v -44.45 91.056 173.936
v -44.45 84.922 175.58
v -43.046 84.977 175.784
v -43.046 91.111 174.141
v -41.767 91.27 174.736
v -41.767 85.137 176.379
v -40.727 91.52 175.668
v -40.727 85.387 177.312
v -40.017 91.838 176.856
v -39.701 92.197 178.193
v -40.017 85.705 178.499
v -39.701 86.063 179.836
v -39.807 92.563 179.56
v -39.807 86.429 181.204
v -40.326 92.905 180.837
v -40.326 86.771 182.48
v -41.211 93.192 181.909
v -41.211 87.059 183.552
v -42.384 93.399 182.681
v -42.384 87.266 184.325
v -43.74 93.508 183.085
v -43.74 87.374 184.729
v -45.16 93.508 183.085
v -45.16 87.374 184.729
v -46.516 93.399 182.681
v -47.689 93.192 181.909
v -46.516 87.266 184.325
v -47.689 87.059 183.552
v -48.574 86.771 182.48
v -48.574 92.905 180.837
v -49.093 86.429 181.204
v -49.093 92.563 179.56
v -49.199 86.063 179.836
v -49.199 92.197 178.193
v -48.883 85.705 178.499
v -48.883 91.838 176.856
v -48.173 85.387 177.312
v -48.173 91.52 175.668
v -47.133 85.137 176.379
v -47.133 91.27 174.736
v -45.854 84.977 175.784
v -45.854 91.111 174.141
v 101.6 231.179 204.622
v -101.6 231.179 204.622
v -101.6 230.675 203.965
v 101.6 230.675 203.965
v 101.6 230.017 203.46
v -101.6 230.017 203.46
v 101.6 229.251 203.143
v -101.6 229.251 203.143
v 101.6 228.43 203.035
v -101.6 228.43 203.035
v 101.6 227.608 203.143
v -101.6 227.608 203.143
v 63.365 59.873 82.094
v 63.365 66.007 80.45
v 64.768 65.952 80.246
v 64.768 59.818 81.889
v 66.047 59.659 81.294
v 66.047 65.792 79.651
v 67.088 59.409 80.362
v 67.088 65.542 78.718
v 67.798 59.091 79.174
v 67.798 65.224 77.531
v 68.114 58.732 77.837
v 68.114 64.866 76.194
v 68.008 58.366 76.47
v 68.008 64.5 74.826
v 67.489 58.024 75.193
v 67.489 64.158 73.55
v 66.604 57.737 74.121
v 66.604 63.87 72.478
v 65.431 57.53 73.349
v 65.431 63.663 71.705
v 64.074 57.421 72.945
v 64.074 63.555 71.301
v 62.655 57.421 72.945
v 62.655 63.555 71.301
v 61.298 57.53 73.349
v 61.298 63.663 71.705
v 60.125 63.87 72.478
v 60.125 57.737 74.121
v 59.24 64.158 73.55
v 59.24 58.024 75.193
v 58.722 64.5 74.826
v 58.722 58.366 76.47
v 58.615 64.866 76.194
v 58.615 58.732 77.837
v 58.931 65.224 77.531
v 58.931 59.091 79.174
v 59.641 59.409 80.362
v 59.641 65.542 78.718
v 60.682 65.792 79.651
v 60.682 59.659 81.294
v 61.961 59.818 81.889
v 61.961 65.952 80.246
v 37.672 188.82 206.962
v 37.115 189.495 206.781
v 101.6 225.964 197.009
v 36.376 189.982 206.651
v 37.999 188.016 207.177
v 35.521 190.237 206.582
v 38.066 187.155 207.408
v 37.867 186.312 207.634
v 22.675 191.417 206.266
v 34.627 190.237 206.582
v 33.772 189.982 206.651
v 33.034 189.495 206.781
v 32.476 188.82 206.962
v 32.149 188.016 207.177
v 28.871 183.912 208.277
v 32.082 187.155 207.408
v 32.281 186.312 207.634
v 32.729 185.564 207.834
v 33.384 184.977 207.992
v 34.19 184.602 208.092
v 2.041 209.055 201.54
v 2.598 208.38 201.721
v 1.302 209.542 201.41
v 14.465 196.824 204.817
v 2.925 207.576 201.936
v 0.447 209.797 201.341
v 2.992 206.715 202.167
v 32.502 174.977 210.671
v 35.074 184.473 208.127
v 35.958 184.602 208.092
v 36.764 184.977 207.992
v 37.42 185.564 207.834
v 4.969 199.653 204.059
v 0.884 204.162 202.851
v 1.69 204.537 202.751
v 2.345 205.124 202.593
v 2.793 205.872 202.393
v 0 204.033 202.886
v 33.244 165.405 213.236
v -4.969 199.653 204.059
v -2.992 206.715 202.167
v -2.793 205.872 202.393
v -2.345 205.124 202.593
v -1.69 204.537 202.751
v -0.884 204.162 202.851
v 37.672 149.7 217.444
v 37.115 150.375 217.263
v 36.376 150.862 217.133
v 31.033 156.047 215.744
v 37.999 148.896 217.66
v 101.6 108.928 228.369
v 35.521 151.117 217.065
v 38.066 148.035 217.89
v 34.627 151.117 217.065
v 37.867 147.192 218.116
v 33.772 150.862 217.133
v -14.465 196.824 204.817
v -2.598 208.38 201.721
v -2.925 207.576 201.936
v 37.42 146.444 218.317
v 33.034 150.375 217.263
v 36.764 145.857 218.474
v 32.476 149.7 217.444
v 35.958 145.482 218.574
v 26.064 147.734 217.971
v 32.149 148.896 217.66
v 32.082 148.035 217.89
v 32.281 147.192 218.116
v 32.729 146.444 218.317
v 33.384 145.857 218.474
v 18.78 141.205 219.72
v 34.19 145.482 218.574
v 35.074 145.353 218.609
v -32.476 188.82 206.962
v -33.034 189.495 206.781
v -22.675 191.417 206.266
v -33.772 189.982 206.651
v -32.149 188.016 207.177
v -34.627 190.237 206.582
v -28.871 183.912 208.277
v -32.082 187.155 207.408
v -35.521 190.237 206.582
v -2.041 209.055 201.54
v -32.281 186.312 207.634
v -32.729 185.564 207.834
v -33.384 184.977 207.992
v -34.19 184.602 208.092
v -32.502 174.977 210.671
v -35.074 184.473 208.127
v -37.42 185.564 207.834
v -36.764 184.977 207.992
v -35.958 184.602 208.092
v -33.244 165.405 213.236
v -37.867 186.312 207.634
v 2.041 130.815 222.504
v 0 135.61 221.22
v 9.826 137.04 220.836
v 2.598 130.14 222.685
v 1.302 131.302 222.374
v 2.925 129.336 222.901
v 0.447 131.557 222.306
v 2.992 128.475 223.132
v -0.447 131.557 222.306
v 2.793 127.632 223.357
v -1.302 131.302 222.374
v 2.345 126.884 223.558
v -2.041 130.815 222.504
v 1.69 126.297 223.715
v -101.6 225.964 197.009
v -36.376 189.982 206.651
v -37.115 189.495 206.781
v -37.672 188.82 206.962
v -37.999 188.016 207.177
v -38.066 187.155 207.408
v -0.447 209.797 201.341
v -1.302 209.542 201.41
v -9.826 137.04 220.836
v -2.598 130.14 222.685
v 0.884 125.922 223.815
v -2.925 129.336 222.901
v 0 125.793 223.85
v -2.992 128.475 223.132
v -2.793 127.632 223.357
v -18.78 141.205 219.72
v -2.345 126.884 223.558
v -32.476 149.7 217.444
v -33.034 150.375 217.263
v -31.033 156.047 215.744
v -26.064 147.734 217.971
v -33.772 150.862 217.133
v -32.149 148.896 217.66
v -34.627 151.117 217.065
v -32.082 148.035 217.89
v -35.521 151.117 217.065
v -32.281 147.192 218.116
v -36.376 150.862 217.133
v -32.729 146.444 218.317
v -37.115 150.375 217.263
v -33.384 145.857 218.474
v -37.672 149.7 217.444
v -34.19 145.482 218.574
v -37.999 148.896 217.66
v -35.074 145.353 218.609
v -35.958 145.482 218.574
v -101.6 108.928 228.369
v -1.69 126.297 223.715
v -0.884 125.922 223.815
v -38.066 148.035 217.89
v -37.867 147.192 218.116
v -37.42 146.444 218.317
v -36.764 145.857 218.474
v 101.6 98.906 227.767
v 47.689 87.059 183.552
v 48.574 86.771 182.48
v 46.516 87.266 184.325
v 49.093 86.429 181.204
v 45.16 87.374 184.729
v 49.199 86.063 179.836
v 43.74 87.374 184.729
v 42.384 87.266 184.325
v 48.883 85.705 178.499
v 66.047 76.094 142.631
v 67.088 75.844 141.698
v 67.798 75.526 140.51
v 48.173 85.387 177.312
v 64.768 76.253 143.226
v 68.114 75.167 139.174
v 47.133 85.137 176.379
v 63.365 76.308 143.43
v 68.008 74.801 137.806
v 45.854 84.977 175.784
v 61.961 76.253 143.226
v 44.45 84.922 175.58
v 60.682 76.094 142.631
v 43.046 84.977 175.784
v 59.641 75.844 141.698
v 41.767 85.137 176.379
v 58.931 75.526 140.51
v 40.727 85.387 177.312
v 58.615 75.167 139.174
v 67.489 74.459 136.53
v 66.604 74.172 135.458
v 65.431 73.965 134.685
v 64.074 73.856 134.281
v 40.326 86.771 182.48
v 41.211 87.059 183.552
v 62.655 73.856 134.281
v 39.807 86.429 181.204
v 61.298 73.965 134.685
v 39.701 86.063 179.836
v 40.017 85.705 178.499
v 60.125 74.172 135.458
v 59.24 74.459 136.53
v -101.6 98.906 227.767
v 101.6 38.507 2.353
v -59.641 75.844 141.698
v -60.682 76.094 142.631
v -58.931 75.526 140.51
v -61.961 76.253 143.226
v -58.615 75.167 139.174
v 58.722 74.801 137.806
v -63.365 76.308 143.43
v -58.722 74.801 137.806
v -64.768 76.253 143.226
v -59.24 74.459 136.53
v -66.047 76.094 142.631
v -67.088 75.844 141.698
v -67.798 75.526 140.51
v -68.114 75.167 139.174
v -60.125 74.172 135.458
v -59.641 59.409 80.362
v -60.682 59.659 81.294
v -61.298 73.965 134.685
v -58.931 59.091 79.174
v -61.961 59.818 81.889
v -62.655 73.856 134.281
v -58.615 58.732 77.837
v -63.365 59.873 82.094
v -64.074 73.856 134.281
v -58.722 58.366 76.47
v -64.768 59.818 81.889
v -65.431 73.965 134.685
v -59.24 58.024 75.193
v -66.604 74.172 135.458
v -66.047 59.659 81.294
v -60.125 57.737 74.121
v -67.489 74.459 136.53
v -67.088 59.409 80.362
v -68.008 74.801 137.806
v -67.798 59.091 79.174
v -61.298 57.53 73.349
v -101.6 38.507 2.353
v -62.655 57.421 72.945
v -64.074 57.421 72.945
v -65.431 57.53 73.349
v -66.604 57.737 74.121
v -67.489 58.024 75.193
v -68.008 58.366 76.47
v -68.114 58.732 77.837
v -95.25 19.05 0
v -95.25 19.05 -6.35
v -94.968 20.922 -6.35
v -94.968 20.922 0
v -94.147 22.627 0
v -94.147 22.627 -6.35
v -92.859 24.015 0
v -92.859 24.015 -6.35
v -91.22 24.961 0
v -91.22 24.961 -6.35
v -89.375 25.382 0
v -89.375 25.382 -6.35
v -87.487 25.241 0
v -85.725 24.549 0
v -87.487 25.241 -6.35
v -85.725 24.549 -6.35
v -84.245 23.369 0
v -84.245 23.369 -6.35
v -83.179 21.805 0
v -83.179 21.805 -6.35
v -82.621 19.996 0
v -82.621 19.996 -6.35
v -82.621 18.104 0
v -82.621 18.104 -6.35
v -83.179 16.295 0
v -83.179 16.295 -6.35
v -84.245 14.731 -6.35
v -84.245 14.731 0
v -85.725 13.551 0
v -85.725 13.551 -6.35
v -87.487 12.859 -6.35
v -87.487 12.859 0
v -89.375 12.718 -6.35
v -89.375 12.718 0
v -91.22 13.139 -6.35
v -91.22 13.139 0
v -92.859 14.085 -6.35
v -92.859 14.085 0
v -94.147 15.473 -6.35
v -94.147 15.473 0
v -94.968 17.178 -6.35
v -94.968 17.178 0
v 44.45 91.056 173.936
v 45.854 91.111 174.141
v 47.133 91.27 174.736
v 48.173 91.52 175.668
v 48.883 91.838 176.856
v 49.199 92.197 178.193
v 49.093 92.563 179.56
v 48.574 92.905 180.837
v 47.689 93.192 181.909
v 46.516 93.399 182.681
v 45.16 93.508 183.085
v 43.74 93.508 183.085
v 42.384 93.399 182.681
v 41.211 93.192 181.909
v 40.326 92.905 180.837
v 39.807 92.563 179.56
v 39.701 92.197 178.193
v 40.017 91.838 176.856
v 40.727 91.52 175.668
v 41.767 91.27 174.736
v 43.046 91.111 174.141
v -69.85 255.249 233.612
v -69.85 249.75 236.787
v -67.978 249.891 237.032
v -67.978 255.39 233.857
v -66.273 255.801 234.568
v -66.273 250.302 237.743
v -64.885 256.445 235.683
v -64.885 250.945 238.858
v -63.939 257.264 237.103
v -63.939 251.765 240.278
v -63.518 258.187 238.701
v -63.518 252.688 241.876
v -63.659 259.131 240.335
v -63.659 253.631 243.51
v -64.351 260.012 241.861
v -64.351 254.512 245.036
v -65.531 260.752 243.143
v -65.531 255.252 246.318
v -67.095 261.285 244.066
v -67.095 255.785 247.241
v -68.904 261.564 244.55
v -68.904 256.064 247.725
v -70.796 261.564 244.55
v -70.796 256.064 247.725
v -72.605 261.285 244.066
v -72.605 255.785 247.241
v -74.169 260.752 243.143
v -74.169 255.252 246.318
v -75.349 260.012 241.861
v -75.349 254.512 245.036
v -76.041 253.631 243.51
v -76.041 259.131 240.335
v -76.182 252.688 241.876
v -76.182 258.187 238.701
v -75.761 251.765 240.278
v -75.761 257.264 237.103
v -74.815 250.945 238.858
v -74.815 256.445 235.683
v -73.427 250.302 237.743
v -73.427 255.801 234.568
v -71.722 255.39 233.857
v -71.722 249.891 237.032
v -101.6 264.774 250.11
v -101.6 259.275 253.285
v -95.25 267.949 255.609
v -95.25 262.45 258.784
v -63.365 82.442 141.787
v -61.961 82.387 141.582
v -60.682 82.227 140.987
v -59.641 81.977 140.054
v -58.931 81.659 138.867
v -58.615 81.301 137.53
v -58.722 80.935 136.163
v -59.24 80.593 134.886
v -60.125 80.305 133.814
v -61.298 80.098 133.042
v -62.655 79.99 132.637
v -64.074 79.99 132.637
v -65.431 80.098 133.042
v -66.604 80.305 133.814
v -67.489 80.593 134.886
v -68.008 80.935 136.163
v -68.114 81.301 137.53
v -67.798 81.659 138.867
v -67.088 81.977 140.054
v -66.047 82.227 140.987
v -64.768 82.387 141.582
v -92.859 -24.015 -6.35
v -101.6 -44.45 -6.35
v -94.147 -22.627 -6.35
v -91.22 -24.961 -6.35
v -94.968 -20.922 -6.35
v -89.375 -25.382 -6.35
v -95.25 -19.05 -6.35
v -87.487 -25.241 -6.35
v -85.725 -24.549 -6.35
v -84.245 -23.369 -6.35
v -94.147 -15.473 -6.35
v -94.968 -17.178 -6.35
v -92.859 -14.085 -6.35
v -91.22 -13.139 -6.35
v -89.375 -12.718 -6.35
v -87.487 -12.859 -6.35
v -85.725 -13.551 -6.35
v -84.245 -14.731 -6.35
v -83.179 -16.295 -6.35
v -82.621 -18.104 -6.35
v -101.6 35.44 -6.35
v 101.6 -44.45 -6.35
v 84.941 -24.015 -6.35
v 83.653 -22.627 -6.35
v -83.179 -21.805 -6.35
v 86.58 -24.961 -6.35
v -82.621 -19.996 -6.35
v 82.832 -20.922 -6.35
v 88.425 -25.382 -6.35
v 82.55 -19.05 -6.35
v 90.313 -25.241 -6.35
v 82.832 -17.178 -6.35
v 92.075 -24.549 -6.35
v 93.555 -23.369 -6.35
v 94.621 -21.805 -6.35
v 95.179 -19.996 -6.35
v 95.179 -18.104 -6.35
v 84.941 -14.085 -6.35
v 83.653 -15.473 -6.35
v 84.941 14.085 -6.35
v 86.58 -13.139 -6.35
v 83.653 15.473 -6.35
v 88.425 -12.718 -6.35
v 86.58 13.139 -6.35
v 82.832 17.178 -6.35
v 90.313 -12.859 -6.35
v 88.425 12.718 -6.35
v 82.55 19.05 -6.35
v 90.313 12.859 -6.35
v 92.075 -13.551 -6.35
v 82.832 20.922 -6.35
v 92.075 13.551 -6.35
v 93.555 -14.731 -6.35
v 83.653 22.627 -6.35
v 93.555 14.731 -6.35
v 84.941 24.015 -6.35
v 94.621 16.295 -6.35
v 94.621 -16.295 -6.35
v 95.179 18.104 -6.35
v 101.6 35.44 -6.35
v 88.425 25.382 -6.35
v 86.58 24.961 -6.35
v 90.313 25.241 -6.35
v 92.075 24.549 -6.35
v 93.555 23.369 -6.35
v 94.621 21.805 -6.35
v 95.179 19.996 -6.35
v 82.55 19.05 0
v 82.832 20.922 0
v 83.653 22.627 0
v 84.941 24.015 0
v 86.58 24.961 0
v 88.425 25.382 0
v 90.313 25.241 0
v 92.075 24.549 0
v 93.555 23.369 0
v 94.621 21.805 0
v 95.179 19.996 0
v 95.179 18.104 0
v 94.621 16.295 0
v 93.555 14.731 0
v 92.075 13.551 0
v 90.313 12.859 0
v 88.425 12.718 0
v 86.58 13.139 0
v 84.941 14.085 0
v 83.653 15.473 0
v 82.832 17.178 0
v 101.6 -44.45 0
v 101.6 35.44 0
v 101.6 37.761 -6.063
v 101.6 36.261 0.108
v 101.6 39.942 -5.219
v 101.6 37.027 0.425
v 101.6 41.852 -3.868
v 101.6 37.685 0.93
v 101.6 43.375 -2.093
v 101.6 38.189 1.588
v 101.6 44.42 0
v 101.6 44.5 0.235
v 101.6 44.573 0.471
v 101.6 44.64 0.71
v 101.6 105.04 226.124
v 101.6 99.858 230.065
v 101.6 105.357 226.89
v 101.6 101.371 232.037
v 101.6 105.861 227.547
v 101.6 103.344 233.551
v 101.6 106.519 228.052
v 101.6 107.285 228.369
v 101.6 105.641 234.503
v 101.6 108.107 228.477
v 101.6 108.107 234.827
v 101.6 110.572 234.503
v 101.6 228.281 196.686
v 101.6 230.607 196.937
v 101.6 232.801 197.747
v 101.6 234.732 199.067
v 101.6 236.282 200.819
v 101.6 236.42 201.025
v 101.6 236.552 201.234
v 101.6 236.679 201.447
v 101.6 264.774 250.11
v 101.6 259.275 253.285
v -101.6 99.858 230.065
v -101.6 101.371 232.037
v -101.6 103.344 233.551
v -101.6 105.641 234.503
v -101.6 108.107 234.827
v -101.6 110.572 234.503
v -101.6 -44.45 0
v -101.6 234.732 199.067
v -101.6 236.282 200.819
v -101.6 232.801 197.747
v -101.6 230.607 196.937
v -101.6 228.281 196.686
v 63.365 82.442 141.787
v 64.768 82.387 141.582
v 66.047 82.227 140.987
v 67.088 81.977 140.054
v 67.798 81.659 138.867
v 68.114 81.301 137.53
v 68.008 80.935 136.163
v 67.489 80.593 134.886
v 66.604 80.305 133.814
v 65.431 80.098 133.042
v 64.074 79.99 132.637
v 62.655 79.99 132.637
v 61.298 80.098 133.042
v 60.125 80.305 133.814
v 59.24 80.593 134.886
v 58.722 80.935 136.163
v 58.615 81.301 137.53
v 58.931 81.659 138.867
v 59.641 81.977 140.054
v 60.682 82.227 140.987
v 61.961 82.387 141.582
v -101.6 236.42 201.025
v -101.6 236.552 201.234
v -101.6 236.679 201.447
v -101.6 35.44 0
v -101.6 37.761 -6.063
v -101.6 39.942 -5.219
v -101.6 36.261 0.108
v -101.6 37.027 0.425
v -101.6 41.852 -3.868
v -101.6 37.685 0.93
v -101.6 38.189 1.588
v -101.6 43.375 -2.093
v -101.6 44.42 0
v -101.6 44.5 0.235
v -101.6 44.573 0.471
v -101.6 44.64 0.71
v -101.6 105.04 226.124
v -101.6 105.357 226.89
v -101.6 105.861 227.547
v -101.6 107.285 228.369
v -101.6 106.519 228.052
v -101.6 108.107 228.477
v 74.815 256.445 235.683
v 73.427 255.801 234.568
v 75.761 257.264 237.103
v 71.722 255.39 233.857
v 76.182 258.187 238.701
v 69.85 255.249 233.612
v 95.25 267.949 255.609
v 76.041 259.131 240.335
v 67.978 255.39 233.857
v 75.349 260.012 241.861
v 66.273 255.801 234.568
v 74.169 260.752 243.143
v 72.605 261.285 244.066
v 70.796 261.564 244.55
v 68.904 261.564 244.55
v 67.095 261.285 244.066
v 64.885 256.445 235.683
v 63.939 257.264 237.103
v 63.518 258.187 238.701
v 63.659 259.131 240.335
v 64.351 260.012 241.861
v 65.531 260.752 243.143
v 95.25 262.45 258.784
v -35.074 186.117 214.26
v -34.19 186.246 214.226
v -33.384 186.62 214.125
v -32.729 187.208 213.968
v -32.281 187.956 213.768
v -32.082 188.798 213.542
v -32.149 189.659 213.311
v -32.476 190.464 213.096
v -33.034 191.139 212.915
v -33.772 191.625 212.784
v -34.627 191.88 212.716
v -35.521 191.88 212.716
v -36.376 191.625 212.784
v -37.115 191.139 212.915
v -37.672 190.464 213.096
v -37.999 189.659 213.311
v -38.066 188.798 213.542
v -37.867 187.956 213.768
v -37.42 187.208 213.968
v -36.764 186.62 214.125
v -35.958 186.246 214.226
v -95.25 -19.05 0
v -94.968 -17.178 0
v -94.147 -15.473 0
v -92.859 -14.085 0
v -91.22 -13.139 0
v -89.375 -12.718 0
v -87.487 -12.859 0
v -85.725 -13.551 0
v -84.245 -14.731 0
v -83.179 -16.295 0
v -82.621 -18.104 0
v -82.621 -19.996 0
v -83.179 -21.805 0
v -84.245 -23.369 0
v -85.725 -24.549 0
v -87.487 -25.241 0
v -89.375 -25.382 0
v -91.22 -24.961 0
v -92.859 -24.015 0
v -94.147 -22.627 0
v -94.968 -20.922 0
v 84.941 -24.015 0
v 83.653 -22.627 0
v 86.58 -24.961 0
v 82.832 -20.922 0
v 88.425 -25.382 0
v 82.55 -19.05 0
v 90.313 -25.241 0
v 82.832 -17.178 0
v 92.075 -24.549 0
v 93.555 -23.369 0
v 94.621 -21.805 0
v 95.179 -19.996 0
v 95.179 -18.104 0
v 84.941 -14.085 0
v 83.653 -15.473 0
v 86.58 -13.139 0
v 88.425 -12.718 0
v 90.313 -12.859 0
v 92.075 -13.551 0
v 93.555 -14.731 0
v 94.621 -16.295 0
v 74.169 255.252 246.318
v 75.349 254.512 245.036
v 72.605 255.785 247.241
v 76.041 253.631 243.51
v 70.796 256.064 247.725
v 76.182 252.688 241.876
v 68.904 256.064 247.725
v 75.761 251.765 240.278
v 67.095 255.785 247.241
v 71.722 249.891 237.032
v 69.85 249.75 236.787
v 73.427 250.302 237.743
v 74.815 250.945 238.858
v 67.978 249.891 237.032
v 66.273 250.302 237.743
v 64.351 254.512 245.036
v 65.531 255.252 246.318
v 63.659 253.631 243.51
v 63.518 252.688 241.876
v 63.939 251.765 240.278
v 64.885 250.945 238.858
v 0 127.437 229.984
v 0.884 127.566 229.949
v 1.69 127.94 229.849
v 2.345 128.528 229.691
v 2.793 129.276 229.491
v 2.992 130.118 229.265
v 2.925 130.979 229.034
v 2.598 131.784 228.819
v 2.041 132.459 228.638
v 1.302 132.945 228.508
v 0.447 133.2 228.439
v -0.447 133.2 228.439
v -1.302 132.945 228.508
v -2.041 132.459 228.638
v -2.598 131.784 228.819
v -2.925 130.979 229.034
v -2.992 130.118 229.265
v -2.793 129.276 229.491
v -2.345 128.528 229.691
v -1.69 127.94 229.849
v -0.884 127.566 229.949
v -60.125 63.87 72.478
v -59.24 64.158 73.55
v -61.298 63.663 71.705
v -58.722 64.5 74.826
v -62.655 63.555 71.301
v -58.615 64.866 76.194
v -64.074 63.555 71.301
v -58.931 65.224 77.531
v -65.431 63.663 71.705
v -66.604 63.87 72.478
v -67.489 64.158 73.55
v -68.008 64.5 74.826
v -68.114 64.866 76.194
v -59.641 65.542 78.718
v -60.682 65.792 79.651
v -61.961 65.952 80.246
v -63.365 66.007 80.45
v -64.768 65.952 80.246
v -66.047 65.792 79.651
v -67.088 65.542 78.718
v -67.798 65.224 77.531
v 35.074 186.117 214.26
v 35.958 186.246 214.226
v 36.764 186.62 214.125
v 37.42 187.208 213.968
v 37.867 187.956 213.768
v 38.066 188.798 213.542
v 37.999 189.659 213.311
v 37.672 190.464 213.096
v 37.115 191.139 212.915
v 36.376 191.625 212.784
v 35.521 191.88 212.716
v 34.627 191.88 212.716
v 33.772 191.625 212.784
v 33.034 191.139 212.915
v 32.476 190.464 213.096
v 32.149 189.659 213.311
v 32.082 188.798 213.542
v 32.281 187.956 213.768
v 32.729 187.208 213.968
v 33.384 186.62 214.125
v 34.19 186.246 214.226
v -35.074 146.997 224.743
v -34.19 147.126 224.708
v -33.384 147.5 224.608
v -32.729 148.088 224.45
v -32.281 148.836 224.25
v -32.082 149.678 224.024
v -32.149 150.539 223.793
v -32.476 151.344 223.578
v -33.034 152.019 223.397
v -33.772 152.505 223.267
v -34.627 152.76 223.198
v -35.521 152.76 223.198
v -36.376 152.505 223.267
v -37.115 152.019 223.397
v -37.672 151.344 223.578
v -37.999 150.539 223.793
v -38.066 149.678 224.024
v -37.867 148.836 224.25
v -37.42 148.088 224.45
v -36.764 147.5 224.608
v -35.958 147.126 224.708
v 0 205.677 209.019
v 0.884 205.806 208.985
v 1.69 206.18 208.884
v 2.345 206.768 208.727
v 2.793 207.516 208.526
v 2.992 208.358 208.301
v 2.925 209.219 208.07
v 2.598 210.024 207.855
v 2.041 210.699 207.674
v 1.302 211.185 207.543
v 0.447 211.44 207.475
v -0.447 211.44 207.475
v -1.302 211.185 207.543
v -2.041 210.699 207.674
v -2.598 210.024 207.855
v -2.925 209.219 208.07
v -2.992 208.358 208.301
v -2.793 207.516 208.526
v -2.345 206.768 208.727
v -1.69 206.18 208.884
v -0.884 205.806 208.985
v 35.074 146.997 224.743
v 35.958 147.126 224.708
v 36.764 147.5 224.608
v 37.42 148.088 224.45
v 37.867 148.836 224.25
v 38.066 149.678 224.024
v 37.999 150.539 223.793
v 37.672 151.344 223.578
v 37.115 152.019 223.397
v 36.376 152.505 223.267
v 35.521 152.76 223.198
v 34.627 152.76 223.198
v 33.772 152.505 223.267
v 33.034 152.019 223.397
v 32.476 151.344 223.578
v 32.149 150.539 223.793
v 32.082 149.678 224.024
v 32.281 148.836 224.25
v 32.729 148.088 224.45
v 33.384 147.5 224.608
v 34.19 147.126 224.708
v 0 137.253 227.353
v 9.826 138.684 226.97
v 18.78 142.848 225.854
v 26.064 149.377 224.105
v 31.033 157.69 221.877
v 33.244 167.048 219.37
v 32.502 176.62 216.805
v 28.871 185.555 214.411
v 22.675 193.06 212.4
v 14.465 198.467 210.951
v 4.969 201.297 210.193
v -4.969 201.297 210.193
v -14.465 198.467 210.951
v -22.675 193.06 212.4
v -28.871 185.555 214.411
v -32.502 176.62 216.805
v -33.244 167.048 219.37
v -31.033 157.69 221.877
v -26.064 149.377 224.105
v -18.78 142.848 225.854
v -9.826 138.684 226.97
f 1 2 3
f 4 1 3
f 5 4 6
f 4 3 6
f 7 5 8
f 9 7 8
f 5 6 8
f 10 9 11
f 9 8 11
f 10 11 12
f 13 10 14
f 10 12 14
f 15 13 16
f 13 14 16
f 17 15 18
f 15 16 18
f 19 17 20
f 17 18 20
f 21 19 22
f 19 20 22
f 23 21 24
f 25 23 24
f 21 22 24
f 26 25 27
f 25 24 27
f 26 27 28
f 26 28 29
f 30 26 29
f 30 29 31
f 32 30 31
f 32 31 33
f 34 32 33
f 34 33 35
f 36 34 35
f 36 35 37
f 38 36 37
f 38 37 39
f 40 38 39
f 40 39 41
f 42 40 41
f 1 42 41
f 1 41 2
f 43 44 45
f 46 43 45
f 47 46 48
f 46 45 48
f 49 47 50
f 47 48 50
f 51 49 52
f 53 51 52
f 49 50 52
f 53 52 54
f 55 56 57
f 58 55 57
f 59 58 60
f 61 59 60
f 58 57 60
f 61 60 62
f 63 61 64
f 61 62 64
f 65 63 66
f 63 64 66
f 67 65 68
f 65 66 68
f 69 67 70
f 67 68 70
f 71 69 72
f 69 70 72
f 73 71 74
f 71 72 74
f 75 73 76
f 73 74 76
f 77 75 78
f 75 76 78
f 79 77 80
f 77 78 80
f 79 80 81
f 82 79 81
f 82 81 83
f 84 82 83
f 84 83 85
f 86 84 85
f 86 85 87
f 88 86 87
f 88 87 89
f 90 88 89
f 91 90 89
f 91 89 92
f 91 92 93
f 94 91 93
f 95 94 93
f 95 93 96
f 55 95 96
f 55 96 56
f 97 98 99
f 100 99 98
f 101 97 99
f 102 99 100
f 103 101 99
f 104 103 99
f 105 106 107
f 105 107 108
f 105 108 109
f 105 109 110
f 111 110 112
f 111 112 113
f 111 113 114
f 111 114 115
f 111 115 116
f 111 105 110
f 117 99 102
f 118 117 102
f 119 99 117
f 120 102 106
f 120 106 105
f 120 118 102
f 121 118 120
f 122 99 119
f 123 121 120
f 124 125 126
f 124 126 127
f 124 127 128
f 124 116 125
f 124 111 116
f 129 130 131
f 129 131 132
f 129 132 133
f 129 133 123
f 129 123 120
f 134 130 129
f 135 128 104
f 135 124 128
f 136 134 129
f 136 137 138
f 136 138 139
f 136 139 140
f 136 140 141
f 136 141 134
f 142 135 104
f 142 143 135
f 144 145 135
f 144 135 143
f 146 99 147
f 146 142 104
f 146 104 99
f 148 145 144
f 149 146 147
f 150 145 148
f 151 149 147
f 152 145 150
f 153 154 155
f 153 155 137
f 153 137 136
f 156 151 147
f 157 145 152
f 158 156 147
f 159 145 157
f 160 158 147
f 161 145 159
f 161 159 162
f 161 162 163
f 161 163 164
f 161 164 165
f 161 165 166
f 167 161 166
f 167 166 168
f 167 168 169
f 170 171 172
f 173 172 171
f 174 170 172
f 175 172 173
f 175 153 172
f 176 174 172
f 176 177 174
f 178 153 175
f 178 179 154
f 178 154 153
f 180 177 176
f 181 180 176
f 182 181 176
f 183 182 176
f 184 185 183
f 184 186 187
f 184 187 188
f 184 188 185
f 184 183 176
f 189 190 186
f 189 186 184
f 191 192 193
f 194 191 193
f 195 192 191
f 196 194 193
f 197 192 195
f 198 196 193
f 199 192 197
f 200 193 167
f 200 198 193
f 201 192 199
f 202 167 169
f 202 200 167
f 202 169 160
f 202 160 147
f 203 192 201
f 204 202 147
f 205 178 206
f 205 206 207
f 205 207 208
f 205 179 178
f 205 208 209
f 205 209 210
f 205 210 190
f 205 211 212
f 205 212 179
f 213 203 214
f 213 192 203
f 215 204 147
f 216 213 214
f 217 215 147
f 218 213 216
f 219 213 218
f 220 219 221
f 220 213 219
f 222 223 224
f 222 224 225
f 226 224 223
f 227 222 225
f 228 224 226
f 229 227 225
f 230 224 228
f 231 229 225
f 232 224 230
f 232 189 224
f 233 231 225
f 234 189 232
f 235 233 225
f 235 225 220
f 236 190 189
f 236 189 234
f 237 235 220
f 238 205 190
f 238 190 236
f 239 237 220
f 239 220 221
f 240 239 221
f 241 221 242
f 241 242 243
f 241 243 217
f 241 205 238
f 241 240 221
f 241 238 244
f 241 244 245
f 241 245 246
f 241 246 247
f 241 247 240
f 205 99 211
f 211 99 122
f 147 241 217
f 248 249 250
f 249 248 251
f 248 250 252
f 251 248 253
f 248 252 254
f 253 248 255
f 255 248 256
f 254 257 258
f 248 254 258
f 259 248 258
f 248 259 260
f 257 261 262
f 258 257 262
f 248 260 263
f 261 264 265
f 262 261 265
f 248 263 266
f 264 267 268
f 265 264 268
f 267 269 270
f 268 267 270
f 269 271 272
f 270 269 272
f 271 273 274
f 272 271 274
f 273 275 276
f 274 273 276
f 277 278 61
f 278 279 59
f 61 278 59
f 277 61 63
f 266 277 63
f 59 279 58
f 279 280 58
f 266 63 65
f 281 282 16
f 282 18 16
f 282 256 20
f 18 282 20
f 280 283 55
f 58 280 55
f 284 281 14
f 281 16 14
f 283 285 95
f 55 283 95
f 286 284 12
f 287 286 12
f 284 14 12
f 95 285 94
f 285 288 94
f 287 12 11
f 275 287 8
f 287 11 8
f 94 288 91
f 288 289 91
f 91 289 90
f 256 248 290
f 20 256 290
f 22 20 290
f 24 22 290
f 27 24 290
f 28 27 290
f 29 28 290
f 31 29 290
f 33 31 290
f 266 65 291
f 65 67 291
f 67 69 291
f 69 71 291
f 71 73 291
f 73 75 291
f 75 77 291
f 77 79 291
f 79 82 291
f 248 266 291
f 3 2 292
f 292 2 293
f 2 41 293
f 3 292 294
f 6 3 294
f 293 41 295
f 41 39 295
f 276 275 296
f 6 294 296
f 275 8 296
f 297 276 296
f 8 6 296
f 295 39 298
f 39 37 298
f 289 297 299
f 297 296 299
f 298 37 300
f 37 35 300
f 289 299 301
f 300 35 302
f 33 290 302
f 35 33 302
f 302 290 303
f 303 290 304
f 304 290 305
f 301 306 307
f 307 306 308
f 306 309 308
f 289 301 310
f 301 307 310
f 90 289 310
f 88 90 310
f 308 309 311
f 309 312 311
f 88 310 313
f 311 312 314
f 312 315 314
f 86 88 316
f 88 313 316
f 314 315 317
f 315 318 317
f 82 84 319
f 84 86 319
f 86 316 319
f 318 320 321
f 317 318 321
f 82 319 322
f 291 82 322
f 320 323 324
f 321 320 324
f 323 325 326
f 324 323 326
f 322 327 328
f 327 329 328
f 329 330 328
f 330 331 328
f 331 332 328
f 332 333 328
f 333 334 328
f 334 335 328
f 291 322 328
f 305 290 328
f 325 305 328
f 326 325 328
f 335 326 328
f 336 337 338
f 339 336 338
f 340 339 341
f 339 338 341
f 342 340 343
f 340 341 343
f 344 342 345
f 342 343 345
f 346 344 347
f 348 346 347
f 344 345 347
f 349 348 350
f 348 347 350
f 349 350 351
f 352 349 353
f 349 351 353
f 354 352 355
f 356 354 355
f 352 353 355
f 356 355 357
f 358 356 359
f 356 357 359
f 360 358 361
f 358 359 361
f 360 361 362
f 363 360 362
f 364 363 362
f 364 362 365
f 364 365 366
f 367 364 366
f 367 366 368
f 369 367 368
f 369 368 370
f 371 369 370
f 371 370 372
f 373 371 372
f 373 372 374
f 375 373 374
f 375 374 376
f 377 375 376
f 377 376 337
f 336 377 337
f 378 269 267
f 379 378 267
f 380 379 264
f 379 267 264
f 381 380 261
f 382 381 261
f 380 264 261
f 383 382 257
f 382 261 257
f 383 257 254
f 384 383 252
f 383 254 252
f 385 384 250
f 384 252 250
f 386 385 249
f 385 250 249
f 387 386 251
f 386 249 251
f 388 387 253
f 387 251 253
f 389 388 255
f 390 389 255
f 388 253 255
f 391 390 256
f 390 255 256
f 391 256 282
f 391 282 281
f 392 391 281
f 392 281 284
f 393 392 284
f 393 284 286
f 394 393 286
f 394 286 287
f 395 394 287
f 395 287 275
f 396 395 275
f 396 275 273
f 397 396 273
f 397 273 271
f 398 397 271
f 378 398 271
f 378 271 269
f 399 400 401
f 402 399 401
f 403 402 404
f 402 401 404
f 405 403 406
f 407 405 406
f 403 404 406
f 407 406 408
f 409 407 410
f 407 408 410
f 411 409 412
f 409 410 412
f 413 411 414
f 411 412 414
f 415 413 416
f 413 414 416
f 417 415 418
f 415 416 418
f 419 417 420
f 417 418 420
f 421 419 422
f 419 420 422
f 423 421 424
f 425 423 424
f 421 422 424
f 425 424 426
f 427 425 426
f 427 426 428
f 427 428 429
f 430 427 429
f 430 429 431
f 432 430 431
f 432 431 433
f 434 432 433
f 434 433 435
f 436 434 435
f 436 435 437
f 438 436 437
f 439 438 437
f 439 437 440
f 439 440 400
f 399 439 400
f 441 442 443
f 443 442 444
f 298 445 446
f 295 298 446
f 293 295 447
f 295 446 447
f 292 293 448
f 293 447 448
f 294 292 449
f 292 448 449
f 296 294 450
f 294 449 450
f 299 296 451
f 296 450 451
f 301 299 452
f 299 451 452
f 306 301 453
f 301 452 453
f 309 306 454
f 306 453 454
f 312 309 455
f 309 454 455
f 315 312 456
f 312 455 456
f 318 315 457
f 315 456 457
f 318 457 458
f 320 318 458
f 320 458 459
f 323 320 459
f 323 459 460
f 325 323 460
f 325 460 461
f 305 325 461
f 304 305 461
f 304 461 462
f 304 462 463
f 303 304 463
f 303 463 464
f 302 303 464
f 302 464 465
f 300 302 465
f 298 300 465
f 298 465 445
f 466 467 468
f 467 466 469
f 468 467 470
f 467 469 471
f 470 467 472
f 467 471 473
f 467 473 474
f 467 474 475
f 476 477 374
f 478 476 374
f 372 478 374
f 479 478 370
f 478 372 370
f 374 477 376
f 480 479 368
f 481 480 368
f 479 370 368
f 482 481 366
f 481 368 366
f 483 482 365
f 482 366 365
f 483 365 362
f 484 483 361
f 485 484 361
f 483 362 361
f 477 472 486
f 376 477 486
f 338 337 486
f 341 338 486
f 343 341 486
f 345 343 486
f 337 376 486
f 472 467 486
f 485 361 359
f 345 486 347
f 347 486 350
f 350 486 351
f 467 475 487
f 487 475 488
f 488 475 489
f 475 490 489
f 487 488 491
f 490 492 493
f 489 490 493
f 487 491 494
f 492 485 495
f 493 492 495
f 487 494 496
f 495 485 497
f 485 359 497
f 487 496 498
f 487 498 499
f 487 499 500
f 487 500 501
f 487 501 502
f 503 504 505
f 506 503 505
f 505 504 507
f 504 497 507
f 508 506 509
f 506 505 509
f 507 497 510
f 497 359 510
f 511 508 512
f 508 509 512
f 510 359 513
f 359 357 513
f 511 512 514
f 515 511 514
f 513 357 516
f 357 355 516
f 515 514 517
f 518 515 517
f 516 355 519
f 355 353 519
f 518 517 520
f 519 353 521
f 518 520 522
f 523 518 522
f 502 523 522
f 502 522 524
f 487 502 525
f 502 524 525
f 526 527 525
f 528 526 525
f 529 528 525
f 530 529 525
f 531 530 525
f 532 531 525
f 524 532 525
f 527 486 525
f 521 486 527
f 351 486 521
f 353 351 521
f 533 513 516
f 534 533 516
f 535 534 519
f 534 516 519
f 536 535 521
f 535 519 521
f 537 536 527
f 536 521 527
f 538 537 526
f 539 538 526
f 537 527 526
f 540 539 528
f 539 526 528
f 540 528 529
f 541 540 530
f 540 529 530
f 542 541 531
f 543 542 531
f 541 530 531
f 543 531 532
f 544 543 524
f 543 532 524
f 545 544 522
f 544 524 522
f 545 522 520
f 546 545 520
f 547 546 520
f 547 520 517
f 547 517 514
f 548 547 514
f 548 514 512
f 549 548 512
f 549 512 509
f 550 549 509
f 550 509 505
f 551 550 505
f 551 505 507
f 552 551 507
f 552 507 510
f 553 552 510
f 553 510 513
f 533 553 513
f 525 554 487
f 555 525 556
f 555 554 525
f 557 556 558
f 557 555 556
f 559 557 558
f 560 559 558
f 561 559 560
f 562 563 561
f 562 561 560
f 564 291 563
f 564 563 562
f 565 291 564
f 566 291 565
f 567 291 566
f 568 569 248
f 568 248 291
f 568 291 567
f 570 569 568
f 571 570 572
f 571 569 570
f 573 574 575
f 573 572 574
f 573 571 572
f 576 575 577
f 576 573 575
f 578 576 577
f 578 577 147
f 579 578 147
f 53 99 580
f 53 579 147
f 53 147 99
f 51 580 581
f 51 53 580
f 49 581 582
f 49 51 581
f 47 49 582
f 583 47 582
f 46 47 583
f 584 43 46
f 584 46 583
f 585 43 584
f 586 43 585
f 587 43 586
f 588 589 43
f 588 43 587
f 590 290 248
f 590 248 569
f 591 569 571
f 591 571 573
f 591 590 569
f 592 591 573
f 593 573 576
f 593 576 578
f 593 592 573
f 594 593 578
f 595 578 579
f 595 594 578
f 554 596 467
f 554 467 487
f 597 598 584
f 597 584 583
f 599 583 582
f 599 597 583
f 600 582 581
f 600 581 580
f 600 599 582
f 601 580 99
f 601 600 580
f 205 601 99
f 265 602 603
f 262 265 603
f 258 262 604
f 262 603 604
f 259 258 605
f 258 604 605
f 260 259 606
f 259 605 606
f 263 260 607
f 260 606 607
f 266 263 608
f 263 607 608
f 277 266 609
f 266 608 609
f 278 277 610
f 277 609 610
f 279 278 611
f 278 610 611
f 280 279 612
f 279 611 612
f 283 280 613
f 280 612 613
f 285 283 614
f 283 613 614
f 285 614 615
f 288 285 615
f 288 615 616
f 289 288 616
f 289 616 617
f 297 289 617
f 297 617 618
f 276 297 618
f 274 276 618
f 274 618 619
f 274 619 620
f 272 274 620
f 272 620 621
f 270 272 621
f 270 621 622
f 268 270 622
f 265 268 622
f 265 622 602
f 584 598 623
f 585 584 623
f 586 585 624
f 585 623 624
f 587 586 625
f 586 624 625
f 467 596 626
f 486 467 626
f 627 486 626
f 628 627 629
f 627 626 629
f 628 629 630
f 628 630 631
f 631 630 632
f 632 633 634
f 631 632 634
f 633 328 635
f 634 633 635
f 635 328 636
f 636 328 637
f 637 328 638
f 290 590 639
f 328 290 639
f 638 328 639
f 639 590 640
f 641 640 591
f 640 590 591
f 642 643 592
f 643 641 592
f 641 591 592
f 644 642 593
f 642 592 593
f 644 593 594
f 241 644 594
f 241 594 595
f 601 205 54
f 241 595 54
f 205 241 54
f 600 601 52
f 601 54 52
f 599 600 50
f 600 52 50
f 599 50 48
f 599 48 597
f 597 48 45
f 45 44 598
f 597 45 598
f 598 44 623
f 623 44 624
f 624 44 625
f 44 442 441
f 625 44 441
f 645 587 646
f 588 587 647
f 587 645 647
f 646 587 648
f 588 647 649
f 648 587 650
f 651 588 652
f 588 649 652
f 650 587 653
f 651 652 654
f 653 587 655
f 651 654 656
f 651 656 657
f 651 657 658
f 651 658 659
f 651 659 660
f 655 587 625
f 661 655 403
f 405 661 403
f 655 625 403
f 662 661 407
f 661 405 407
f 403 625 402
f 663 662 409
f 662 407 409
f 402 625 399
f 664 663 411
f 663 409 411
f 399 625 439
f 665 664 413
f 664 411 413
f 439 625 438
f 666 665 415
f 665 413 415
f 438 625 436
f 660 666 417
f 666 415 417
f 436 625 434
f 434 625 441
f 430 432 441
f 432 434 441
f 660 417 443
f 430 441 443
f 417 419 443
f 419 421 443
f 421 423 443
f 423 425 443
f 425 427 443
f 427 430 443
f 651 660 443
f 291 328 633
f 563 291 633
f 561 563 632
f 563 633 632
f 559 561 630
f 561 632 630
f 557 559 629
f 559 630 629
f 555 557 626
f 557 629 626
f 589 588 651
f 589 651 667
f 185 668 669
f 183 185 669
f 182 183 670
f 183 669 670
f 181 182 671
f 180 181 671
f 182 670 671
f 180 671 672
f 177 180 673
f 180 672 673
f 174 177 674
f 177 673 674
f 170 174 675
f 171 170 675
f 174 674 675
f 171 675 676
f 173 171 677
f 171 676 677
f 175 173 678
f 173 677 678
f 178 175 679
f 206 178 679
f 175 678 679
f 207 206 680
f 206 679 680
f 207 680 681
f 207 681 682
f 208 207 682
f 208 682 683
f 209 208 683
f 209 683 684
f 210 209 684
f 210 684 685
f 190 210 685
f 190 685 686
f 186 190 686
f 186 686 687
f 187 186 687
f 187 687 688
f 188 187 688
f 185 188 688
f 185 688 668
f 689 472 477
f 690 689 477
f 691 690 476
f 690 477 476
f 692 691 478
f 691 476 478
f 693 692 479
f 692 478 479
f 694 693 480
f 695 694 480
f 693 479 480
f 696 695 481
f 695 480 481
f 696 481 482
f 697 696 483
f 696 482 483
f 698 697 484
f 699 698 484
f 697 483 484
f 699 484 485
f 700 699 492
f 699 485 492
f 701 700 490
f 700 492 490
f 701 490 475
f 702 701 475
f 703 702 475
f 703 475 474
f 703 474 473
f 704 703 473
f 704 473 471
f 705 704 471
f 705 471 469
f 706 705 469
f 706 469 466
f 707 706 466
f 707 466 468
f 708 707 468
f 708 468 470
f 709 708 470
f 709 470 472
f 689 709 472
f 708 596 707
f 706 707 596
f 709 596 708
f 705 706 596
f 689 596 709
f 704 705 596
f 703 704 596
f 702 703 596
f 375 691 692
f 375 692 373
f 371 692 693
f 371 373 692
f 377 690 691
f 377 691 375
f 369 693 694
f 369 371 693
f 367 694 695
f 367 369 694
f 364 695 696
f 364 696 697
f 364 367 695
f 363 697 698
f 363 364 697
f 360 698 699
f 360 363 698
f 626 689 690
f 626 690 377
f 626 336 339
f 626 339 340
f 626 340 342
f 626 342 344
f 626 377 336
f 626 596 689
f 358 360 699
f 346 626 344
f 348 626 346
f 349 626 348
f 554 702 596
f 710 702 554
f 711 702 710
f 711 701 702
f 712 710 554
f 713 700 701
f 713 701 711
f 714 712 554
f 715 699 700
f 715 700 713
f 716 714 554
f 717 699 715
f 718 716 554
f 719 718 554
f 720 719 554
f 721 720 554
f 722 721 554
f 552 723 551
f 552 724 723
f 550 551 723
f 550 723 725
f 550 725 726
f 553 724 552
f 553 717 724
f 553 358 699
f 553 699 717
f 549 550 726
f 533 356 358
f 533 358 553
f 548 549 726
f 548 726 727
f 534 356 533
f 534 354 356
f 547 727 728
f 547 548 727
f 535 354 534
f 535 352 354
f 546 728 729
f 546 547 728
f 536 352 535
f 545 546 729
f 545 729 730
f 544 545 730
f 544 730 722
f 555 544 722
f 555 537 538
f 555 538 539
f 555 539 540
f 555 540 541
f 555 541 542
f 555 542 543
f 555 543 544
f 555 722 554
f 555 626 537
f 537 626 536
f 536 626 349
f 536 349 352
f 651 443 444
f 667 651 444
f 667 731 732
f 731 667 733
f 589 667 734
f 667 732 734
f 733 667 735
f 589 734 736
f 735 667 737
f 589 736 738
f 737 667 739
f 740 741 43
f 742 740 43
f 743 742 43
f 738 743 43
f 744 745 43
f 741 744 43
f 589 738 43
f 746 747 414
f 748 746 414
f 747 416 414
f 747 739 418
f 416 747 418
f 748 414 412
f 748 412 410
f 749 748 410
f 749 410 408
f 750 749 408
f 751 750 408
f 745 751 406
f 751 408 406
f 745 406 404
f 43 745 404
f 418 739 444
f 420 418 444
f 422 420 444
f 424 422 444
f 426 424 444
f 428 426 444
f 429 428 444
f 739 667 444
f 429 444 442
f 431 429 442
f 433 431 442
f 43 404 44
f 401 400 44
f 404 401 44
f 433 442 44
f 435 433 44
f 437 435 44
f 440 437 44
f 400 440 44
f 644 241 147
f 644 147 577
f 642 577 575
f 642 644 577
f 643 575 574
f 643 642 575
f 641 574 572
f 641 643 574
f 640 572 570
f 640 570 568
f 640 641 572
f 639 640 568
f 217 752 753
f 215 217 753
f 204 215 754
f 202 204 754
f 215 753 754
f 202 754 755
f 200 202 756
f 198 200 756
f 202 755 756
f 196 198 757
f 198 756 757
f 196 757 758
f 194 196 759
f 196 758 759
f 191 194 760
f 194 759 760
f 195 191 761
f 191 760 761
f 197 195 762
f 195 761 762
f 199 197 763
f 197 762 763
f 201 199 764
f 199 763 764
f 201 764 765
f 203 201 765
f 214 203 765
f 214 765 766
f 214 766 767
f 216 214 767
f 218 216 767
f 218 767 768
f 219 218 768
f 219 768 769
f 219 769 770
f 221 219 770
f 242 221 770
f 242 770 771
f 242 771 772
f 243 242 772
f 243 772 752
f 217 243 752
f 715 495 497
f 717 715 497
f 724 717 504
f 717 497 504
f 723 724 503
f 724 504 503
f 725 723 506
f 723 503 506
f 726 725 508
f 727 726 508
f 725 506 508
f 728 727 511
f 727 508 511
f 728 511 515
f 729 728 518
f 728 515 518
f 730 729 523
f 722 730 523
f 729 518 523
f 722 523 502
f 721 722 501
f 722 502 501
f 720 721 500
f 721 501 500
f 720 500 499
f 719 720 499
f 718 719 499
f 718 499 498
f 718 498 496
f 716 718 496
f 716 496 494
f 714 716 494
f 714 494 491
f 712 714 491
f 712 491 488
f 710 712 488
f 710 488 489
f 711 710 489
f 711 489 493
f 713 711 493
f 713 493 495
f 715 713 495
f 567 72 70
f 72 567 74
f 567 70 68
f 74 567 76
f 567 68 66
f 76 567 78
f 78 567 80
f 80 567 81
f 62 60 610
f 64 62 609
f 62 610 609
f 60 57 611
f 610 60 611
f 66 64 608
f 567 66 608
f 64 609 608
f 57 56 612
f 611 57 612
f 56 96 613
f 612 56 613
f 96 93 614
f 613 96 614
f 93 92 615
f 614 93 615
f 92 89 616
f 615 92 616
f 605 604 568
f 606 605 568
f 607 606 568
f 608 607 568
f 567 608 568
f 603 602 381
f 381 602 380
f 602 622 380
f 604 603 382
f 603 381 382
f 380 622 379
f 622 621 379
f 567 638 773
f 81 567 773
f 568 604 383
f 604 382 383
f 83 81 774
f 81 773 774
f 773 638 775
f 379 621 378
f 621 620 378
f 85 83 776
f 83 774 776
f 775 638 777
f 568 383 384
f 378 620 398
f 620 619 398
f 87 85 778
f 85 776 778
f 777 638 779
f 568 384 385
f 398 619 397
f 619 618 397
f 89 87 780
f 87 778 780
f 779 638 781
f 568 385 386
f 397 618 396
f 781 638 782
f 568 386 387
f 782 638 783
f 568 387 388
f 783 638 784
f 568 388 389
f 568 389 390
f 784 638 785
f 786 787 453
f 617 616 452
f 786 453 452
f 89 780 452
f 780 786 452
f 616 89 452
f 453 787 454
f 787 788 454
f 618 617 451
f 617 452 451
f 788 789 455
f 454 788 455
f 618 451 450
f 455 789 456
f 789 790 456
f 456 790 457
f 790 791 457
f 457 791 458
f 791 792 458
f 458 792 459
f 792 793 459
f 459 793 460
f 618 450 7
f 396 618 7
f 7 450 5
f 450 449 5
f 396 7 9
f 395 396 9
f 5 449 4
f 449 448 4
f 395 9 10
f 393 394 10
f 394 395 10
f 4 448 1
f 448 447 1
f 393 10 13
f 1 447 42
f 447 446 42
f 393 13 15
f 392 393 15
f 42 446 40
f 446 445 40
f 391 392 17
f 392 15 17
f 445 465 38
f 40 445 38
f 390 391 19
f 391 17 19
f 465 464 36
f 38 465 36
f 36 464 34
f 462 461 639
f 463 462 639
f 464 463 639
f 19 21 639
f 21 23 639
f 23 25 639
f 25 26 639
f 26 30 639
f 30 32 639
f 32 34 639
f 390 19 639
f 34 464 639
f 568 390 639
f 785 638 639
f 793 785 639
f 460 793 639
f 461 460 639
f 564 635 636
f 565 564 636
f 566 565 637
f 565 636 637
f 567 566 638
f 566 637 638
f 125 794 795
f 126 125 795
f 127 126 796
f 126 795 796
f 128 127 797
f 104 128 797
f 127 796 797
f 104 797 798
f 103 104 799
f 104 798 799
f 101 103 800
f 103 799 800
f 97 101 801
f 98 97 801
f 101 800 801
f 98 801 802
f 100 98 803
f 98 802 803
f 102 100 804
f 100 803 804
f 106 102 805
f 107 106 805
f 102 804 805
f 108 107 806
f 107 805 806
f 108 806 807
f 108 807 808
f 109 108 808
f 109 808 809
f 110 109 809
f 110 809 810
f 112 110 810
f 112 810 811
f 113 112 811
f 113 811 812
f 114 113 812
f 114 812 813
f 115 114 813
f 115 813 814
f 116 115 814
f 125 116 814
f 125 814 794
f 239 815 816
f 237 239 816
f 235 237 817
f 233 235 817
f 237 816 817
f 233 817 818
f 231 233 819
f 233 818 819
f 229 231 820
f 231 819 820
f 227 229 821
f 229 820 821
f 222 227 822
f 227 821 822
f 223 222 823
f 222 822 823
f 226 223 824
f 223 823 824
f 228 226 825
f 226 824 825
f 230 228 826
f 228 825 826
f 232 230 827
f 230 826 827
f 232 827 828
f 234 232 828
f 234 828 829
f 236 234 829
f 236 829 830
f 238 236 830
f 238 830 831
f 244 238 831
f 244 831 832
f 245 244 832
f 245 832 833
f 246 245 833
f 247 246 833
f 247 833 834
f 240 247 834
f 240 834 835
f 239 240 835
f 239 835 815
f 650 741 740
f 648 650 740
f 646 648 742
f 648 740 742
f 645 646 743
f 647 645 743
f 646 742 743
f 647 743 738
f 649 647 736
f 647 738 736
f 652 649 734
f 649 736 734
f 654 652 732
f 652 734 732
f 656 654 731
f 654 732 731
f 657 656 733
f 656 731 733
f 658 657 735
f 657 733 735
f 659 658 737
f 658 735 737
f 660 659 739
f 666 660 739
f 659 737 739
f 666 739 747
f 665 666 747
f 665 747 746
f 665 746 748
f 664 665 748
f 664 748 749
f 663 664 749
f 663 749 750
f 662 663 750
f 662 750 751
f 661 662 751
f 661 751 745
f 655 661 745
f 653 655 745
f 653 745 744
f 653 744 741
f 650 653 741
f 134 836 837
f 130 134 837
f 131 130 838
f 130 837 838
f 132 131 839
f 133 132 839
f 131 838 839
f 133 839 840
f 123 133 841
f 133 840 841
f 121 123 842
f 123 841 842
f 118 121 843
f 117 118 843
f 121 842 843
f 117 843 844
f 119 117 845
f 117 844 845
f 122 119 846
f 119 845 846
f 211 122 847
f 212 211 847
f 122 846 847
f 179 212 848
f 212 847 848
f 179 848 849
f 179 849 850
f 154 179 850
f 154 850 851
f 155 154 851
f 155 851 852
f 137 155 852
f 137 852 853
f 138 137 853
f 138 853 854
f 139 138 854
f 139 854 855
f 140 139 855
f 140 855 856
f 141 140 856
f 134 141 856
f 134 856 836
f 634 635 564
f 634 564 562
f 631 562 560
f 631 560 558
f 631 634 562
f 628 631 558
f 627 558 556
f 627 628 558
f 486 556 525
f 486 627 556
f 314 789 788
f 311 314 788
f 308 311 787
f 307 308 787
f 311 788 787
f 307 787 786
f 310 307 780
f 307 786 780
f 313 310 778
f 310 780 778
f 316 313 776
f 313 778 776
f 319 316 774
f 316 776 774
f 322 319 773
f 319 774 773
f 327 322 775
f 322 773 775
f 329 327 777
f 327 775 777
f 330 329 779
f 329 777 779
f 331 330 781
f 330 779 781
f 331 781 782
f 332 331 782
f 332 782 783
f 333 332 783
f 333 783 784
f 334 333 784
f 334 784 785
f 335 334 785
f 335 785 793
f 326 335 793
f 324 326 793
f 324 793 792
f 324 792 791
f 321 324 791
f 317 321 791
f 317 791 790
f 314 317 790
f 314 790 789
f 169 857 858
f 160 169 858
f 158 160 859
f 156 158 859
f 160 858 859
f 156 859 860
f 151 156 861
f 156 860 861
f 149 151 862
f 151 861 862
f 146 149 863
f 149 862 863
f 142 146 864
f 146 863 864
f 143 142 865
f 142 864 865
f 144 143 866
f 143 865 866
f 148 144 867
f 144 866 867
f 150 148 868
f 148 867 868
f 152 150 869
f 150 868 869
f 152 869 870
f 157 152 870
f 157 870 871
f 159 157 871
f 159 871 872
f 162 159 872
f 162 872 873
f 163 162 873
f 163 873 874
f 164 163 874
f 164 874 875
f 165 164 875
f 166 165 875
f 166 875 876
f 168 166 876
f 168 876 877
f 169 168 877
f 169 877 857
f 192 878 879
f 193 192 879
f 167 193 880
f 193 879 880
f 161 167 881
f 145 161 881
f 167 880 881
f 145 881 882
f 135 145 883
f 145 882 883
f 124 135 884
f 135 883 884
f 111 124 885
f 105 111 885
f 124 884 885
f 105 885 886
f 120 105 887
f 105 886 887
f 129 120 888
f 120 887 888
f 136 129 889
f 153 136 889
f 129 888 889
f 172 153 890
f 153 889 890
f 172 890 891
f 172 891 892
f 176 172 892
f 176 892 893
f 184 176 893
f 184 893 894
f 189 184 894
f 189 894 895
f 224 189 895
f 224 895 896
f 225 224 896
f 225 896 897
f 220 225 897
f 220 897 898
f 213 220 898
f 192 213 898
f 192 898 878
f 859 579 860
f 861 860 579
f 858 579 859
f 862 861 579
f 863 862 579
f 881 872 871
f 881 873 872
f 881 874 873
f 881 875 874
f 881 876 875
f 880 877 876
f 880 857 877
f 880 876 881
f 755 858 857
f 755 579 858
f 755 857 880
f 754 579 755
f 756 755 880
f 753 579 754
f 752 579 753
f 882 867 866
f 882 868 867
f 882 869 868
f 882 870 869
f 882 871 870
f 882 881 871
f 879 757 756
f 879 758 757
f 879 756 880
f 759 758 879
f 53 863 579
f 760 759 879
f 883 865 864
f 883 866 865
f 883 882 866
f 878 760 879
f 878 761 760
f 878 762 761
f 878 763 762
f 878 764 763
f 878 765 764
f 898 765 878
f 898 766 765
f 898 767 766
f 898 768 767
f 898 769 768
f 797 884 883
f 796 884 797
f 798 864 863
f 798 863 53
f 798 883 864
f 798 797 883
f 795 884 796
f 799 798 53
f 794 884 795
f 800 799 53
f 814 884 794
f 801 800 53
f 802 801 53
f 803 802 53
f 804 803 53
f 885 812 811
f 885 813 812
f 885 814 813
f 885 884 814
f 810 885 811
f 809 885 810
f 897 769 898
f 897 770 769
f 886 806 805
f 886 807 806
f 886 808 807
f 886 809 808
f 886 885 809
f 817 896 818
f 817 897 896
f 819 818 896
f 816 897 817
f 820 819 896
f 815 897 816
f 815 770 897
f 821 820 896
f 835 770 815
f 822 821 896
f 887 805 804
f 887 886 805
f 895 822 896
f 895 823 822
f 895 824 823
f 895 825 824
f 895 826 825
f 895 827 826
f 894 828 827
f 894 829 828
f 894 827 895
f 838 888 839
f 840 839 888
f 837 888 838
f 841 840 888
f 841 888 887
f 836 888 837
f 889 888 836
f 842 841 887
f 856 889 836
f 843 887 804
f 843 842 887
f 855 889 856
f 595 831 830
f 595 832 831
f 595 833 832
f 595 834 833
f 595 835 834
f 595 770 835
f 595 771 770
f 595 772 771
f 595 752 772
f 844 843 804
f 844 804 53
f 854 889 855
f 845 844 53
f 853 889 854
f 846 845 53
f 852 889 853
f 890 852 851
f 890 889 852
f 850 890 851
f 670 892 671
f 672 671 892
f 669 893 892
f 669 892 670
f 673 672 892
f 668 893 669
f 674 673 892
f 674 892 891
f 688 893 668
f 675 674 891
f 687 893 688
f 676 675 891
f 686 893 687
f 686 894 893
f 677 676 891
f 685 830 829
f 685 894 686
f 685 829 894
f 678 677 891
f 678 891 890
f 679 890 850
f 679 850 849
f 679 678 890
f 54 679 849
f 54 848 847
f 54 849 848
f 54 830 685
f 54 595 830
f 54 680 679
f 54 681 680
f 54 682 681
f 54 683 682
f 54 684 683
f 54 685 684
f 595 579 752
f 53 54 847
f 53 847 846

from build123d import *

# Parameters (mm, degrees)
SKETCH2_W                    = 203.2
SKETCH2_H                    = 88.9
BASE_FLANGE1_DEPTH           = 6.35
EDGE_FLANGE1_START           = -101.6
EDGE_FLANGE1_DEPTH           = 203.2
EDGE_FLANGE1_2_DEPTH         = 203.2
EDGE_FLANGE2_STRIP_W         = 31.75
EDGE_FLANGE2_STRIP_H         = 6.35
EDGE_FLANGE2_STRIP_CUT_DEPTH = 203.2
EDGE_FLANGE2_DEPTH           = 203.2
SKETCH13_R                   = 33.3375
SKETCH13_R_2                 = 3
CUT_EXTRUDE1_DEPTH           = 322.27645633
EDGE_FLANGE3_START           = -101.6
EDGE_FLANGE3_DEPTH           = 203.2
EDGE_FLANGE3_2_DEPTH         = 203.2
SKETCH17_R                   = 6.35
CUT_EXTRUDE2_DEPTH           = 373.253425916
SKETCH18_R                   = 4.7625
CUT_EXTRUDE3_DEPTH           = 370.310259163
BREAK_CORNER1_START          = -323.104570995
BREAK_CORNER1_OUTLINE_W      = 145.614442934
BREAK_CORNER1_OUTLINE_H      = 10
BREAK_CORNER1_DEPTH          = 4.490128061
BREAK_CORNER1_START_2        = -183.910601118
BREAK_CORNER1_2_OUTLINE_W    = 5.385557066
BREAK_CORNER1_2_OUTLINE_H    = 10
BREAK_CORNER1_2_DEPTH        = 8.980256121
SKETCH19_R                   = 6.35
CUT_EXTRUDE4_DEPTH           = 391.404403674
SKETCH20_R                   = 4.7625
CUT_EXTRUDE5_DEPTH           = 367.686034552


# Read off the part's stored shape, not the designer's step: Edge-Flange1, Edge-Flange3, Break-Corner1
# Sheet-metal steps are written as plain solids
with BuildPart() as part:
    # Sketch2 → Base-Flange1 (new body)
    with BuildSketch(Plane.XY):
        Rectangle(SKETCH2_W, SKETCH2_H)
    extrude(amount=-BASE_FLANGE1_DEPTH)

    # Edge-Flange1 outline → Edge-Flange1 (cut)
    with BuildSketch(Plane.YZ.offset(EDGE_FLANGE1_START)):
        with BuildLine():
            Line((44.45, 0), (44.419989189, 0))
            ThreePointArc((44.419989189, 0), (40.938994382, -4.602129933), (35.439733068, -6.35))
            Line((35.439733068, -6.35), (44.45, -6.35))
            Line((44.45, -6.35), (44.45, 0))
        make_face()
    extrude(amount=EDGE_FLANGE1_DEPTH, mode=Mode.SUBTRACT)

    # Edge-Flange1 2 outline → Edge-Flange1 2 (add)
    with BuildSketch(Plane.YZ.offset(EDGE_FLANGE1_START)):
        with BuildLine():
            ThreePointArc((44.419989189, 0), (44.537007132, 0.352726165), (44.640176563, 0.709748595))
            Line((44.640176563, 0.709748595), (107.504969662, 235.324350447))
            Line((107.504969662, 235.324350447), (101.371340665, 236.967851383))
            Line((101.371340665, 236.967851383), (38.506547566, 2.353249532))
            ThreePointArc((38.506547566, 2.353249532), (37.372550605, 0.656103145), (35.439733068, 0))
            Line((35.439733068, 0), (44.419989189, 0))
        make_face()
    extrude(amount=EDGE_FLANGE1_2_DEPTH)

    # Edge-Flange2 strip (across the edge) → Edge-Flange2 strip cut (cut)
    with BuildSketch(Plane(origin=(-101.6, 107.504969662, 235.324350447), x_dir=(0, -0.25881904510252135, -0.9659258262890682), z_dir=(1, 0, 0))):
        with Locations((-6.35, -3.175)):
            Rectangle(EDGE_FLANGE2_STRIP_W, EDGE_FLANGE2_STRIP_H)
    extrude(amount=EDGE_FLANGE2_STRIP_CUT_DEPTH, mode=Mode.SUBTRACT)

    # Edge-Flange2 section (across the edge) → Edge-Flange2 (add)
    with BuildSketch(Plane(origin=(-101.6, 107.504969662, 235.324350447), x_dir=(0, -0.25881904510252135, -0.9659258262890682), z_dir=(1, 0, 0))):
        with BuildLine():
            Line((0, 3.175), (0, 133.35))
            Line((0, 133.35), (6.35, 133.35))
            Line((6.35, 133.35), (6.35, 3.175))
            ThreePointArc((6.35, 3.175), (7.27993597, 0.92993597), (9.525, 0))
            Line((9.525, 0), (9.525, -6.35))
            ThreePointArc((9.525, -6.35), (2.789807909, -3.560192091), (0, 3.175))
        make_face()
    extrude(amount=EDGE_FLANGE2_DEPTH)

    # Sketch13 → Cut-Extrude1 (cut, through all)
    with BuildSketch(Plane(origin=(0, 66.032555063, 246.436850447), x_dir=(1, 0, 0), z_dir=(0, 0.25881904510252135, 0.9659258262890682))):
        with Locations(Location((0, 107.070402979, 0), (0, 0, 270))):
            Circle(SKETCH13_R)
        with Locations(Location((35.074028853, 86.820402979, 0), (0, 0, 270))):
            Circle(SKETCH13_R_2)
        with Locations(Location((0, 66.570402979, 0), (0, 0, 270))):
            Circle(SKETCH13_R_2)
        with Locations(Location((-35.074028853, 86.820402979, 0), (0, 0, 270))):
            Circle(SKETCH13_R_2)
        with Locations(Location((-35.074028853, 127.320402979, 0), (0, 0, 270))):
            Circle(SKETCH13_R_2)
        with Locations(Location((35.074028853, 127.320402979, 0), (0, 0, 270))):
            Circle(SKETCH13_R_2)
        with Locations(Location((0, 147.570402979, 0), (0, 0, 270))):
            Circle(SKETCH13_R_2)
    extrude(amount=-CUT_EXTRUDE1_DEPTH, mode=Mode.SUBTRACT)

    # Edge-Flange3 outline → Edge-Flange3 (cut)
    with BuildSketch(Plane.YZ.offset(EDGE_FLANGE3_START)):
        with BuildLine():
            Line((236.311178597, 200.810830783), (236.28219038, 200.818598152))
            ThreePointArc((236.28219038, 200.818598152), (231.72868872, 197.274229745), (225.964428129, 197.009230469))
            Line((225.964428129, 197.009230469), (234.667677661, 194.677201786))
            Line((234.667677661, 194.677201786), (236.311178597, 200.810830783))
        make_face()
    extrude(amount=EDGE_FLANGE3_DEPTH, mode=Mode.SUBTRACT)

    # Edge-Flange3 2 outline → Edge-Flange3 2 (add)
    with BuildSketch(Plane.YZ.offset(EDGE_FLANGE3_START)):
        with BuildLine():
            ThreePointArc((236.28219038, 200.818598152), (236.486513283, 201.129018993), (236.678571505, 201.447173965))
            Line((236.678571505, 201.447173965), (267.949176724, 255.609450989))
            Line((267.949176724, 255.609450989), (262.44991541, 258.784450989))
            Line((262.44991541, 258.784450989), (231.179310191, 204.622173965))
            ThreePointArc((231.179310191, 204.622173965), (229.644699431, 203.276356449), (227.607929065, 203.142859466))
            Line((227.607929065, 203.142859466), (236.28219038, 200.818598152))
        make_face()
    extrude(amount=EDGE_FLANGE3_2_DEPTH)

    # Sketch17 → Cut-Extrude2 (cut, through all)
    with BuildSketch(Plane(origin=(0, 84.780482228, -48.948034236), x_dir=(1, 0, 0), z_dir=(0, -0.8660254037844363, 0.5000000000000042))):
        with Locations(Location((-69.85, 336.288866366, 0), (0, 0, 270))):
            Circle(SKETCH17_R)
        with Locations(Location((69.85, 336.288866366, 0), (0, 0, 270))):
            Circle(SKETCH17_R)
    extrude(amount=-CUT_EXTRUDE2_DEPTH, mode=Mode.SUBTRACT)

    # Sketch18 → Cut-Extrude3 (cut, through all)
    with BuildSketch(Plane(origin=(0, 35.338785602, -9.468999064), x_dir=(1, 0, 0), z_dir=(0, -0.9659258262890673, 0.2588190451025248))):
        with Locations(Location((-44.45, 196.339070344, 0), (0, 0, 270))):
            Circle(SKETCH18_R)
        with Locations(Location((44.45, 196.339070344, 0), (0, 0, 270))):
            Circle(SKETCH18_R)
    extrude(amount=-CUT_EXTRUDE3_DEPTH, mode=Mode.SUBTRACT)

    # Break-Corner1 outline → Break-Corner1 (cut)
    with BuildSketch(Plane(origin=(0, 0, 0), x_dir=(0.7071067811865475, 0.35355339059327684, 0.6123724356957928), z_dir=(0.7071067811865476, -0.3535533905932768, -0.6123724356957927)).offset(BREAK_CORNER1_START)):
        with Locations((245.807221467, -101)):
            Rectangle(BREAK_CORNER1_OUTLINE_W, BREAK_CORNER1_OUTLINE_H)
    extrude(amount=BREAK_CORNER1_DEPTH, mode=Mode.SUBTRACT)

    # Break-Corner1 2 outline → Break-Corner1 2 (cut)
    with BuildSketch(Plane(origin=(0, 0, 0), x_dir=(0.7071067811865475, 0.35355339059327684, 0.6123724356957928), z_dir=(0.7071067811865476, -0.3535533905932768, -0.6123724356957927)).offset(BREAK_CORNER1_START_2)):
        with Locations((321.307221467, -101)):
            Rectangle(BREAK_CORNER1_2_OUTLINE_W, BREAK_CORNER1_2_OUTLINE_H)
    extrude(amount=BREAK_CORNER1_2_DEPTH, mode=Mode.SUBTRACT)

    # Sketch19 → Cut-Extrude4 (cut, through all)
    with BuildSketch(Plane(origin=(0, 0, -6.35), x_dir=(-1, 0, 0), z_dir=(0, 0, -1))):
        with Locations((-88.9, 19.05)):
            Circle(SKETCH19_R)
        with Locations((-88.9, -19.05)):
            Circle(SKETCH19_R)
        with Locations((88.9, -19.05)):
            Circle(SKETCH19_R)
        with Locations((88.9, 19.05)):
            Circle(SKETCH19_R)
    extrude(amount=-CUT_EXTRUDE4_DEPTH, mode=Mode.SUBTRACT)

    # Sketch20 → Cut-Extrude5 (cut, through all)
    with BuildSketch(Plane(origin=(0, 41.472414599, -11.1125), x_dir=(1, 0, 0), z_dir=(0, 0.9659258262890673, -0.2588190451025248))):
        with Locations(Location((63.364615818, -153.530201243, 0), (0, 0, 270))):
            Circle(SKETCH20_R)
        with Locations(Location((63.364615818, -90.030201243, 0), (0, 0, 270))):
            Circle(SKETCH20_R)
        with Locations(Location((-63.364615818, -90.030201243, 0), (0, 0, 270))):
            Circle(SKETCH20_R)
        with Locations(Location((-63.364615818, -153.530201243, 0), (0, 0, 270))):
            Circle(SKETCH20_R)
    extrude(amount=-CUT_EXTRUDE5_DEPTH, mode=Mode.SUBTRACT)


solid = part.part
